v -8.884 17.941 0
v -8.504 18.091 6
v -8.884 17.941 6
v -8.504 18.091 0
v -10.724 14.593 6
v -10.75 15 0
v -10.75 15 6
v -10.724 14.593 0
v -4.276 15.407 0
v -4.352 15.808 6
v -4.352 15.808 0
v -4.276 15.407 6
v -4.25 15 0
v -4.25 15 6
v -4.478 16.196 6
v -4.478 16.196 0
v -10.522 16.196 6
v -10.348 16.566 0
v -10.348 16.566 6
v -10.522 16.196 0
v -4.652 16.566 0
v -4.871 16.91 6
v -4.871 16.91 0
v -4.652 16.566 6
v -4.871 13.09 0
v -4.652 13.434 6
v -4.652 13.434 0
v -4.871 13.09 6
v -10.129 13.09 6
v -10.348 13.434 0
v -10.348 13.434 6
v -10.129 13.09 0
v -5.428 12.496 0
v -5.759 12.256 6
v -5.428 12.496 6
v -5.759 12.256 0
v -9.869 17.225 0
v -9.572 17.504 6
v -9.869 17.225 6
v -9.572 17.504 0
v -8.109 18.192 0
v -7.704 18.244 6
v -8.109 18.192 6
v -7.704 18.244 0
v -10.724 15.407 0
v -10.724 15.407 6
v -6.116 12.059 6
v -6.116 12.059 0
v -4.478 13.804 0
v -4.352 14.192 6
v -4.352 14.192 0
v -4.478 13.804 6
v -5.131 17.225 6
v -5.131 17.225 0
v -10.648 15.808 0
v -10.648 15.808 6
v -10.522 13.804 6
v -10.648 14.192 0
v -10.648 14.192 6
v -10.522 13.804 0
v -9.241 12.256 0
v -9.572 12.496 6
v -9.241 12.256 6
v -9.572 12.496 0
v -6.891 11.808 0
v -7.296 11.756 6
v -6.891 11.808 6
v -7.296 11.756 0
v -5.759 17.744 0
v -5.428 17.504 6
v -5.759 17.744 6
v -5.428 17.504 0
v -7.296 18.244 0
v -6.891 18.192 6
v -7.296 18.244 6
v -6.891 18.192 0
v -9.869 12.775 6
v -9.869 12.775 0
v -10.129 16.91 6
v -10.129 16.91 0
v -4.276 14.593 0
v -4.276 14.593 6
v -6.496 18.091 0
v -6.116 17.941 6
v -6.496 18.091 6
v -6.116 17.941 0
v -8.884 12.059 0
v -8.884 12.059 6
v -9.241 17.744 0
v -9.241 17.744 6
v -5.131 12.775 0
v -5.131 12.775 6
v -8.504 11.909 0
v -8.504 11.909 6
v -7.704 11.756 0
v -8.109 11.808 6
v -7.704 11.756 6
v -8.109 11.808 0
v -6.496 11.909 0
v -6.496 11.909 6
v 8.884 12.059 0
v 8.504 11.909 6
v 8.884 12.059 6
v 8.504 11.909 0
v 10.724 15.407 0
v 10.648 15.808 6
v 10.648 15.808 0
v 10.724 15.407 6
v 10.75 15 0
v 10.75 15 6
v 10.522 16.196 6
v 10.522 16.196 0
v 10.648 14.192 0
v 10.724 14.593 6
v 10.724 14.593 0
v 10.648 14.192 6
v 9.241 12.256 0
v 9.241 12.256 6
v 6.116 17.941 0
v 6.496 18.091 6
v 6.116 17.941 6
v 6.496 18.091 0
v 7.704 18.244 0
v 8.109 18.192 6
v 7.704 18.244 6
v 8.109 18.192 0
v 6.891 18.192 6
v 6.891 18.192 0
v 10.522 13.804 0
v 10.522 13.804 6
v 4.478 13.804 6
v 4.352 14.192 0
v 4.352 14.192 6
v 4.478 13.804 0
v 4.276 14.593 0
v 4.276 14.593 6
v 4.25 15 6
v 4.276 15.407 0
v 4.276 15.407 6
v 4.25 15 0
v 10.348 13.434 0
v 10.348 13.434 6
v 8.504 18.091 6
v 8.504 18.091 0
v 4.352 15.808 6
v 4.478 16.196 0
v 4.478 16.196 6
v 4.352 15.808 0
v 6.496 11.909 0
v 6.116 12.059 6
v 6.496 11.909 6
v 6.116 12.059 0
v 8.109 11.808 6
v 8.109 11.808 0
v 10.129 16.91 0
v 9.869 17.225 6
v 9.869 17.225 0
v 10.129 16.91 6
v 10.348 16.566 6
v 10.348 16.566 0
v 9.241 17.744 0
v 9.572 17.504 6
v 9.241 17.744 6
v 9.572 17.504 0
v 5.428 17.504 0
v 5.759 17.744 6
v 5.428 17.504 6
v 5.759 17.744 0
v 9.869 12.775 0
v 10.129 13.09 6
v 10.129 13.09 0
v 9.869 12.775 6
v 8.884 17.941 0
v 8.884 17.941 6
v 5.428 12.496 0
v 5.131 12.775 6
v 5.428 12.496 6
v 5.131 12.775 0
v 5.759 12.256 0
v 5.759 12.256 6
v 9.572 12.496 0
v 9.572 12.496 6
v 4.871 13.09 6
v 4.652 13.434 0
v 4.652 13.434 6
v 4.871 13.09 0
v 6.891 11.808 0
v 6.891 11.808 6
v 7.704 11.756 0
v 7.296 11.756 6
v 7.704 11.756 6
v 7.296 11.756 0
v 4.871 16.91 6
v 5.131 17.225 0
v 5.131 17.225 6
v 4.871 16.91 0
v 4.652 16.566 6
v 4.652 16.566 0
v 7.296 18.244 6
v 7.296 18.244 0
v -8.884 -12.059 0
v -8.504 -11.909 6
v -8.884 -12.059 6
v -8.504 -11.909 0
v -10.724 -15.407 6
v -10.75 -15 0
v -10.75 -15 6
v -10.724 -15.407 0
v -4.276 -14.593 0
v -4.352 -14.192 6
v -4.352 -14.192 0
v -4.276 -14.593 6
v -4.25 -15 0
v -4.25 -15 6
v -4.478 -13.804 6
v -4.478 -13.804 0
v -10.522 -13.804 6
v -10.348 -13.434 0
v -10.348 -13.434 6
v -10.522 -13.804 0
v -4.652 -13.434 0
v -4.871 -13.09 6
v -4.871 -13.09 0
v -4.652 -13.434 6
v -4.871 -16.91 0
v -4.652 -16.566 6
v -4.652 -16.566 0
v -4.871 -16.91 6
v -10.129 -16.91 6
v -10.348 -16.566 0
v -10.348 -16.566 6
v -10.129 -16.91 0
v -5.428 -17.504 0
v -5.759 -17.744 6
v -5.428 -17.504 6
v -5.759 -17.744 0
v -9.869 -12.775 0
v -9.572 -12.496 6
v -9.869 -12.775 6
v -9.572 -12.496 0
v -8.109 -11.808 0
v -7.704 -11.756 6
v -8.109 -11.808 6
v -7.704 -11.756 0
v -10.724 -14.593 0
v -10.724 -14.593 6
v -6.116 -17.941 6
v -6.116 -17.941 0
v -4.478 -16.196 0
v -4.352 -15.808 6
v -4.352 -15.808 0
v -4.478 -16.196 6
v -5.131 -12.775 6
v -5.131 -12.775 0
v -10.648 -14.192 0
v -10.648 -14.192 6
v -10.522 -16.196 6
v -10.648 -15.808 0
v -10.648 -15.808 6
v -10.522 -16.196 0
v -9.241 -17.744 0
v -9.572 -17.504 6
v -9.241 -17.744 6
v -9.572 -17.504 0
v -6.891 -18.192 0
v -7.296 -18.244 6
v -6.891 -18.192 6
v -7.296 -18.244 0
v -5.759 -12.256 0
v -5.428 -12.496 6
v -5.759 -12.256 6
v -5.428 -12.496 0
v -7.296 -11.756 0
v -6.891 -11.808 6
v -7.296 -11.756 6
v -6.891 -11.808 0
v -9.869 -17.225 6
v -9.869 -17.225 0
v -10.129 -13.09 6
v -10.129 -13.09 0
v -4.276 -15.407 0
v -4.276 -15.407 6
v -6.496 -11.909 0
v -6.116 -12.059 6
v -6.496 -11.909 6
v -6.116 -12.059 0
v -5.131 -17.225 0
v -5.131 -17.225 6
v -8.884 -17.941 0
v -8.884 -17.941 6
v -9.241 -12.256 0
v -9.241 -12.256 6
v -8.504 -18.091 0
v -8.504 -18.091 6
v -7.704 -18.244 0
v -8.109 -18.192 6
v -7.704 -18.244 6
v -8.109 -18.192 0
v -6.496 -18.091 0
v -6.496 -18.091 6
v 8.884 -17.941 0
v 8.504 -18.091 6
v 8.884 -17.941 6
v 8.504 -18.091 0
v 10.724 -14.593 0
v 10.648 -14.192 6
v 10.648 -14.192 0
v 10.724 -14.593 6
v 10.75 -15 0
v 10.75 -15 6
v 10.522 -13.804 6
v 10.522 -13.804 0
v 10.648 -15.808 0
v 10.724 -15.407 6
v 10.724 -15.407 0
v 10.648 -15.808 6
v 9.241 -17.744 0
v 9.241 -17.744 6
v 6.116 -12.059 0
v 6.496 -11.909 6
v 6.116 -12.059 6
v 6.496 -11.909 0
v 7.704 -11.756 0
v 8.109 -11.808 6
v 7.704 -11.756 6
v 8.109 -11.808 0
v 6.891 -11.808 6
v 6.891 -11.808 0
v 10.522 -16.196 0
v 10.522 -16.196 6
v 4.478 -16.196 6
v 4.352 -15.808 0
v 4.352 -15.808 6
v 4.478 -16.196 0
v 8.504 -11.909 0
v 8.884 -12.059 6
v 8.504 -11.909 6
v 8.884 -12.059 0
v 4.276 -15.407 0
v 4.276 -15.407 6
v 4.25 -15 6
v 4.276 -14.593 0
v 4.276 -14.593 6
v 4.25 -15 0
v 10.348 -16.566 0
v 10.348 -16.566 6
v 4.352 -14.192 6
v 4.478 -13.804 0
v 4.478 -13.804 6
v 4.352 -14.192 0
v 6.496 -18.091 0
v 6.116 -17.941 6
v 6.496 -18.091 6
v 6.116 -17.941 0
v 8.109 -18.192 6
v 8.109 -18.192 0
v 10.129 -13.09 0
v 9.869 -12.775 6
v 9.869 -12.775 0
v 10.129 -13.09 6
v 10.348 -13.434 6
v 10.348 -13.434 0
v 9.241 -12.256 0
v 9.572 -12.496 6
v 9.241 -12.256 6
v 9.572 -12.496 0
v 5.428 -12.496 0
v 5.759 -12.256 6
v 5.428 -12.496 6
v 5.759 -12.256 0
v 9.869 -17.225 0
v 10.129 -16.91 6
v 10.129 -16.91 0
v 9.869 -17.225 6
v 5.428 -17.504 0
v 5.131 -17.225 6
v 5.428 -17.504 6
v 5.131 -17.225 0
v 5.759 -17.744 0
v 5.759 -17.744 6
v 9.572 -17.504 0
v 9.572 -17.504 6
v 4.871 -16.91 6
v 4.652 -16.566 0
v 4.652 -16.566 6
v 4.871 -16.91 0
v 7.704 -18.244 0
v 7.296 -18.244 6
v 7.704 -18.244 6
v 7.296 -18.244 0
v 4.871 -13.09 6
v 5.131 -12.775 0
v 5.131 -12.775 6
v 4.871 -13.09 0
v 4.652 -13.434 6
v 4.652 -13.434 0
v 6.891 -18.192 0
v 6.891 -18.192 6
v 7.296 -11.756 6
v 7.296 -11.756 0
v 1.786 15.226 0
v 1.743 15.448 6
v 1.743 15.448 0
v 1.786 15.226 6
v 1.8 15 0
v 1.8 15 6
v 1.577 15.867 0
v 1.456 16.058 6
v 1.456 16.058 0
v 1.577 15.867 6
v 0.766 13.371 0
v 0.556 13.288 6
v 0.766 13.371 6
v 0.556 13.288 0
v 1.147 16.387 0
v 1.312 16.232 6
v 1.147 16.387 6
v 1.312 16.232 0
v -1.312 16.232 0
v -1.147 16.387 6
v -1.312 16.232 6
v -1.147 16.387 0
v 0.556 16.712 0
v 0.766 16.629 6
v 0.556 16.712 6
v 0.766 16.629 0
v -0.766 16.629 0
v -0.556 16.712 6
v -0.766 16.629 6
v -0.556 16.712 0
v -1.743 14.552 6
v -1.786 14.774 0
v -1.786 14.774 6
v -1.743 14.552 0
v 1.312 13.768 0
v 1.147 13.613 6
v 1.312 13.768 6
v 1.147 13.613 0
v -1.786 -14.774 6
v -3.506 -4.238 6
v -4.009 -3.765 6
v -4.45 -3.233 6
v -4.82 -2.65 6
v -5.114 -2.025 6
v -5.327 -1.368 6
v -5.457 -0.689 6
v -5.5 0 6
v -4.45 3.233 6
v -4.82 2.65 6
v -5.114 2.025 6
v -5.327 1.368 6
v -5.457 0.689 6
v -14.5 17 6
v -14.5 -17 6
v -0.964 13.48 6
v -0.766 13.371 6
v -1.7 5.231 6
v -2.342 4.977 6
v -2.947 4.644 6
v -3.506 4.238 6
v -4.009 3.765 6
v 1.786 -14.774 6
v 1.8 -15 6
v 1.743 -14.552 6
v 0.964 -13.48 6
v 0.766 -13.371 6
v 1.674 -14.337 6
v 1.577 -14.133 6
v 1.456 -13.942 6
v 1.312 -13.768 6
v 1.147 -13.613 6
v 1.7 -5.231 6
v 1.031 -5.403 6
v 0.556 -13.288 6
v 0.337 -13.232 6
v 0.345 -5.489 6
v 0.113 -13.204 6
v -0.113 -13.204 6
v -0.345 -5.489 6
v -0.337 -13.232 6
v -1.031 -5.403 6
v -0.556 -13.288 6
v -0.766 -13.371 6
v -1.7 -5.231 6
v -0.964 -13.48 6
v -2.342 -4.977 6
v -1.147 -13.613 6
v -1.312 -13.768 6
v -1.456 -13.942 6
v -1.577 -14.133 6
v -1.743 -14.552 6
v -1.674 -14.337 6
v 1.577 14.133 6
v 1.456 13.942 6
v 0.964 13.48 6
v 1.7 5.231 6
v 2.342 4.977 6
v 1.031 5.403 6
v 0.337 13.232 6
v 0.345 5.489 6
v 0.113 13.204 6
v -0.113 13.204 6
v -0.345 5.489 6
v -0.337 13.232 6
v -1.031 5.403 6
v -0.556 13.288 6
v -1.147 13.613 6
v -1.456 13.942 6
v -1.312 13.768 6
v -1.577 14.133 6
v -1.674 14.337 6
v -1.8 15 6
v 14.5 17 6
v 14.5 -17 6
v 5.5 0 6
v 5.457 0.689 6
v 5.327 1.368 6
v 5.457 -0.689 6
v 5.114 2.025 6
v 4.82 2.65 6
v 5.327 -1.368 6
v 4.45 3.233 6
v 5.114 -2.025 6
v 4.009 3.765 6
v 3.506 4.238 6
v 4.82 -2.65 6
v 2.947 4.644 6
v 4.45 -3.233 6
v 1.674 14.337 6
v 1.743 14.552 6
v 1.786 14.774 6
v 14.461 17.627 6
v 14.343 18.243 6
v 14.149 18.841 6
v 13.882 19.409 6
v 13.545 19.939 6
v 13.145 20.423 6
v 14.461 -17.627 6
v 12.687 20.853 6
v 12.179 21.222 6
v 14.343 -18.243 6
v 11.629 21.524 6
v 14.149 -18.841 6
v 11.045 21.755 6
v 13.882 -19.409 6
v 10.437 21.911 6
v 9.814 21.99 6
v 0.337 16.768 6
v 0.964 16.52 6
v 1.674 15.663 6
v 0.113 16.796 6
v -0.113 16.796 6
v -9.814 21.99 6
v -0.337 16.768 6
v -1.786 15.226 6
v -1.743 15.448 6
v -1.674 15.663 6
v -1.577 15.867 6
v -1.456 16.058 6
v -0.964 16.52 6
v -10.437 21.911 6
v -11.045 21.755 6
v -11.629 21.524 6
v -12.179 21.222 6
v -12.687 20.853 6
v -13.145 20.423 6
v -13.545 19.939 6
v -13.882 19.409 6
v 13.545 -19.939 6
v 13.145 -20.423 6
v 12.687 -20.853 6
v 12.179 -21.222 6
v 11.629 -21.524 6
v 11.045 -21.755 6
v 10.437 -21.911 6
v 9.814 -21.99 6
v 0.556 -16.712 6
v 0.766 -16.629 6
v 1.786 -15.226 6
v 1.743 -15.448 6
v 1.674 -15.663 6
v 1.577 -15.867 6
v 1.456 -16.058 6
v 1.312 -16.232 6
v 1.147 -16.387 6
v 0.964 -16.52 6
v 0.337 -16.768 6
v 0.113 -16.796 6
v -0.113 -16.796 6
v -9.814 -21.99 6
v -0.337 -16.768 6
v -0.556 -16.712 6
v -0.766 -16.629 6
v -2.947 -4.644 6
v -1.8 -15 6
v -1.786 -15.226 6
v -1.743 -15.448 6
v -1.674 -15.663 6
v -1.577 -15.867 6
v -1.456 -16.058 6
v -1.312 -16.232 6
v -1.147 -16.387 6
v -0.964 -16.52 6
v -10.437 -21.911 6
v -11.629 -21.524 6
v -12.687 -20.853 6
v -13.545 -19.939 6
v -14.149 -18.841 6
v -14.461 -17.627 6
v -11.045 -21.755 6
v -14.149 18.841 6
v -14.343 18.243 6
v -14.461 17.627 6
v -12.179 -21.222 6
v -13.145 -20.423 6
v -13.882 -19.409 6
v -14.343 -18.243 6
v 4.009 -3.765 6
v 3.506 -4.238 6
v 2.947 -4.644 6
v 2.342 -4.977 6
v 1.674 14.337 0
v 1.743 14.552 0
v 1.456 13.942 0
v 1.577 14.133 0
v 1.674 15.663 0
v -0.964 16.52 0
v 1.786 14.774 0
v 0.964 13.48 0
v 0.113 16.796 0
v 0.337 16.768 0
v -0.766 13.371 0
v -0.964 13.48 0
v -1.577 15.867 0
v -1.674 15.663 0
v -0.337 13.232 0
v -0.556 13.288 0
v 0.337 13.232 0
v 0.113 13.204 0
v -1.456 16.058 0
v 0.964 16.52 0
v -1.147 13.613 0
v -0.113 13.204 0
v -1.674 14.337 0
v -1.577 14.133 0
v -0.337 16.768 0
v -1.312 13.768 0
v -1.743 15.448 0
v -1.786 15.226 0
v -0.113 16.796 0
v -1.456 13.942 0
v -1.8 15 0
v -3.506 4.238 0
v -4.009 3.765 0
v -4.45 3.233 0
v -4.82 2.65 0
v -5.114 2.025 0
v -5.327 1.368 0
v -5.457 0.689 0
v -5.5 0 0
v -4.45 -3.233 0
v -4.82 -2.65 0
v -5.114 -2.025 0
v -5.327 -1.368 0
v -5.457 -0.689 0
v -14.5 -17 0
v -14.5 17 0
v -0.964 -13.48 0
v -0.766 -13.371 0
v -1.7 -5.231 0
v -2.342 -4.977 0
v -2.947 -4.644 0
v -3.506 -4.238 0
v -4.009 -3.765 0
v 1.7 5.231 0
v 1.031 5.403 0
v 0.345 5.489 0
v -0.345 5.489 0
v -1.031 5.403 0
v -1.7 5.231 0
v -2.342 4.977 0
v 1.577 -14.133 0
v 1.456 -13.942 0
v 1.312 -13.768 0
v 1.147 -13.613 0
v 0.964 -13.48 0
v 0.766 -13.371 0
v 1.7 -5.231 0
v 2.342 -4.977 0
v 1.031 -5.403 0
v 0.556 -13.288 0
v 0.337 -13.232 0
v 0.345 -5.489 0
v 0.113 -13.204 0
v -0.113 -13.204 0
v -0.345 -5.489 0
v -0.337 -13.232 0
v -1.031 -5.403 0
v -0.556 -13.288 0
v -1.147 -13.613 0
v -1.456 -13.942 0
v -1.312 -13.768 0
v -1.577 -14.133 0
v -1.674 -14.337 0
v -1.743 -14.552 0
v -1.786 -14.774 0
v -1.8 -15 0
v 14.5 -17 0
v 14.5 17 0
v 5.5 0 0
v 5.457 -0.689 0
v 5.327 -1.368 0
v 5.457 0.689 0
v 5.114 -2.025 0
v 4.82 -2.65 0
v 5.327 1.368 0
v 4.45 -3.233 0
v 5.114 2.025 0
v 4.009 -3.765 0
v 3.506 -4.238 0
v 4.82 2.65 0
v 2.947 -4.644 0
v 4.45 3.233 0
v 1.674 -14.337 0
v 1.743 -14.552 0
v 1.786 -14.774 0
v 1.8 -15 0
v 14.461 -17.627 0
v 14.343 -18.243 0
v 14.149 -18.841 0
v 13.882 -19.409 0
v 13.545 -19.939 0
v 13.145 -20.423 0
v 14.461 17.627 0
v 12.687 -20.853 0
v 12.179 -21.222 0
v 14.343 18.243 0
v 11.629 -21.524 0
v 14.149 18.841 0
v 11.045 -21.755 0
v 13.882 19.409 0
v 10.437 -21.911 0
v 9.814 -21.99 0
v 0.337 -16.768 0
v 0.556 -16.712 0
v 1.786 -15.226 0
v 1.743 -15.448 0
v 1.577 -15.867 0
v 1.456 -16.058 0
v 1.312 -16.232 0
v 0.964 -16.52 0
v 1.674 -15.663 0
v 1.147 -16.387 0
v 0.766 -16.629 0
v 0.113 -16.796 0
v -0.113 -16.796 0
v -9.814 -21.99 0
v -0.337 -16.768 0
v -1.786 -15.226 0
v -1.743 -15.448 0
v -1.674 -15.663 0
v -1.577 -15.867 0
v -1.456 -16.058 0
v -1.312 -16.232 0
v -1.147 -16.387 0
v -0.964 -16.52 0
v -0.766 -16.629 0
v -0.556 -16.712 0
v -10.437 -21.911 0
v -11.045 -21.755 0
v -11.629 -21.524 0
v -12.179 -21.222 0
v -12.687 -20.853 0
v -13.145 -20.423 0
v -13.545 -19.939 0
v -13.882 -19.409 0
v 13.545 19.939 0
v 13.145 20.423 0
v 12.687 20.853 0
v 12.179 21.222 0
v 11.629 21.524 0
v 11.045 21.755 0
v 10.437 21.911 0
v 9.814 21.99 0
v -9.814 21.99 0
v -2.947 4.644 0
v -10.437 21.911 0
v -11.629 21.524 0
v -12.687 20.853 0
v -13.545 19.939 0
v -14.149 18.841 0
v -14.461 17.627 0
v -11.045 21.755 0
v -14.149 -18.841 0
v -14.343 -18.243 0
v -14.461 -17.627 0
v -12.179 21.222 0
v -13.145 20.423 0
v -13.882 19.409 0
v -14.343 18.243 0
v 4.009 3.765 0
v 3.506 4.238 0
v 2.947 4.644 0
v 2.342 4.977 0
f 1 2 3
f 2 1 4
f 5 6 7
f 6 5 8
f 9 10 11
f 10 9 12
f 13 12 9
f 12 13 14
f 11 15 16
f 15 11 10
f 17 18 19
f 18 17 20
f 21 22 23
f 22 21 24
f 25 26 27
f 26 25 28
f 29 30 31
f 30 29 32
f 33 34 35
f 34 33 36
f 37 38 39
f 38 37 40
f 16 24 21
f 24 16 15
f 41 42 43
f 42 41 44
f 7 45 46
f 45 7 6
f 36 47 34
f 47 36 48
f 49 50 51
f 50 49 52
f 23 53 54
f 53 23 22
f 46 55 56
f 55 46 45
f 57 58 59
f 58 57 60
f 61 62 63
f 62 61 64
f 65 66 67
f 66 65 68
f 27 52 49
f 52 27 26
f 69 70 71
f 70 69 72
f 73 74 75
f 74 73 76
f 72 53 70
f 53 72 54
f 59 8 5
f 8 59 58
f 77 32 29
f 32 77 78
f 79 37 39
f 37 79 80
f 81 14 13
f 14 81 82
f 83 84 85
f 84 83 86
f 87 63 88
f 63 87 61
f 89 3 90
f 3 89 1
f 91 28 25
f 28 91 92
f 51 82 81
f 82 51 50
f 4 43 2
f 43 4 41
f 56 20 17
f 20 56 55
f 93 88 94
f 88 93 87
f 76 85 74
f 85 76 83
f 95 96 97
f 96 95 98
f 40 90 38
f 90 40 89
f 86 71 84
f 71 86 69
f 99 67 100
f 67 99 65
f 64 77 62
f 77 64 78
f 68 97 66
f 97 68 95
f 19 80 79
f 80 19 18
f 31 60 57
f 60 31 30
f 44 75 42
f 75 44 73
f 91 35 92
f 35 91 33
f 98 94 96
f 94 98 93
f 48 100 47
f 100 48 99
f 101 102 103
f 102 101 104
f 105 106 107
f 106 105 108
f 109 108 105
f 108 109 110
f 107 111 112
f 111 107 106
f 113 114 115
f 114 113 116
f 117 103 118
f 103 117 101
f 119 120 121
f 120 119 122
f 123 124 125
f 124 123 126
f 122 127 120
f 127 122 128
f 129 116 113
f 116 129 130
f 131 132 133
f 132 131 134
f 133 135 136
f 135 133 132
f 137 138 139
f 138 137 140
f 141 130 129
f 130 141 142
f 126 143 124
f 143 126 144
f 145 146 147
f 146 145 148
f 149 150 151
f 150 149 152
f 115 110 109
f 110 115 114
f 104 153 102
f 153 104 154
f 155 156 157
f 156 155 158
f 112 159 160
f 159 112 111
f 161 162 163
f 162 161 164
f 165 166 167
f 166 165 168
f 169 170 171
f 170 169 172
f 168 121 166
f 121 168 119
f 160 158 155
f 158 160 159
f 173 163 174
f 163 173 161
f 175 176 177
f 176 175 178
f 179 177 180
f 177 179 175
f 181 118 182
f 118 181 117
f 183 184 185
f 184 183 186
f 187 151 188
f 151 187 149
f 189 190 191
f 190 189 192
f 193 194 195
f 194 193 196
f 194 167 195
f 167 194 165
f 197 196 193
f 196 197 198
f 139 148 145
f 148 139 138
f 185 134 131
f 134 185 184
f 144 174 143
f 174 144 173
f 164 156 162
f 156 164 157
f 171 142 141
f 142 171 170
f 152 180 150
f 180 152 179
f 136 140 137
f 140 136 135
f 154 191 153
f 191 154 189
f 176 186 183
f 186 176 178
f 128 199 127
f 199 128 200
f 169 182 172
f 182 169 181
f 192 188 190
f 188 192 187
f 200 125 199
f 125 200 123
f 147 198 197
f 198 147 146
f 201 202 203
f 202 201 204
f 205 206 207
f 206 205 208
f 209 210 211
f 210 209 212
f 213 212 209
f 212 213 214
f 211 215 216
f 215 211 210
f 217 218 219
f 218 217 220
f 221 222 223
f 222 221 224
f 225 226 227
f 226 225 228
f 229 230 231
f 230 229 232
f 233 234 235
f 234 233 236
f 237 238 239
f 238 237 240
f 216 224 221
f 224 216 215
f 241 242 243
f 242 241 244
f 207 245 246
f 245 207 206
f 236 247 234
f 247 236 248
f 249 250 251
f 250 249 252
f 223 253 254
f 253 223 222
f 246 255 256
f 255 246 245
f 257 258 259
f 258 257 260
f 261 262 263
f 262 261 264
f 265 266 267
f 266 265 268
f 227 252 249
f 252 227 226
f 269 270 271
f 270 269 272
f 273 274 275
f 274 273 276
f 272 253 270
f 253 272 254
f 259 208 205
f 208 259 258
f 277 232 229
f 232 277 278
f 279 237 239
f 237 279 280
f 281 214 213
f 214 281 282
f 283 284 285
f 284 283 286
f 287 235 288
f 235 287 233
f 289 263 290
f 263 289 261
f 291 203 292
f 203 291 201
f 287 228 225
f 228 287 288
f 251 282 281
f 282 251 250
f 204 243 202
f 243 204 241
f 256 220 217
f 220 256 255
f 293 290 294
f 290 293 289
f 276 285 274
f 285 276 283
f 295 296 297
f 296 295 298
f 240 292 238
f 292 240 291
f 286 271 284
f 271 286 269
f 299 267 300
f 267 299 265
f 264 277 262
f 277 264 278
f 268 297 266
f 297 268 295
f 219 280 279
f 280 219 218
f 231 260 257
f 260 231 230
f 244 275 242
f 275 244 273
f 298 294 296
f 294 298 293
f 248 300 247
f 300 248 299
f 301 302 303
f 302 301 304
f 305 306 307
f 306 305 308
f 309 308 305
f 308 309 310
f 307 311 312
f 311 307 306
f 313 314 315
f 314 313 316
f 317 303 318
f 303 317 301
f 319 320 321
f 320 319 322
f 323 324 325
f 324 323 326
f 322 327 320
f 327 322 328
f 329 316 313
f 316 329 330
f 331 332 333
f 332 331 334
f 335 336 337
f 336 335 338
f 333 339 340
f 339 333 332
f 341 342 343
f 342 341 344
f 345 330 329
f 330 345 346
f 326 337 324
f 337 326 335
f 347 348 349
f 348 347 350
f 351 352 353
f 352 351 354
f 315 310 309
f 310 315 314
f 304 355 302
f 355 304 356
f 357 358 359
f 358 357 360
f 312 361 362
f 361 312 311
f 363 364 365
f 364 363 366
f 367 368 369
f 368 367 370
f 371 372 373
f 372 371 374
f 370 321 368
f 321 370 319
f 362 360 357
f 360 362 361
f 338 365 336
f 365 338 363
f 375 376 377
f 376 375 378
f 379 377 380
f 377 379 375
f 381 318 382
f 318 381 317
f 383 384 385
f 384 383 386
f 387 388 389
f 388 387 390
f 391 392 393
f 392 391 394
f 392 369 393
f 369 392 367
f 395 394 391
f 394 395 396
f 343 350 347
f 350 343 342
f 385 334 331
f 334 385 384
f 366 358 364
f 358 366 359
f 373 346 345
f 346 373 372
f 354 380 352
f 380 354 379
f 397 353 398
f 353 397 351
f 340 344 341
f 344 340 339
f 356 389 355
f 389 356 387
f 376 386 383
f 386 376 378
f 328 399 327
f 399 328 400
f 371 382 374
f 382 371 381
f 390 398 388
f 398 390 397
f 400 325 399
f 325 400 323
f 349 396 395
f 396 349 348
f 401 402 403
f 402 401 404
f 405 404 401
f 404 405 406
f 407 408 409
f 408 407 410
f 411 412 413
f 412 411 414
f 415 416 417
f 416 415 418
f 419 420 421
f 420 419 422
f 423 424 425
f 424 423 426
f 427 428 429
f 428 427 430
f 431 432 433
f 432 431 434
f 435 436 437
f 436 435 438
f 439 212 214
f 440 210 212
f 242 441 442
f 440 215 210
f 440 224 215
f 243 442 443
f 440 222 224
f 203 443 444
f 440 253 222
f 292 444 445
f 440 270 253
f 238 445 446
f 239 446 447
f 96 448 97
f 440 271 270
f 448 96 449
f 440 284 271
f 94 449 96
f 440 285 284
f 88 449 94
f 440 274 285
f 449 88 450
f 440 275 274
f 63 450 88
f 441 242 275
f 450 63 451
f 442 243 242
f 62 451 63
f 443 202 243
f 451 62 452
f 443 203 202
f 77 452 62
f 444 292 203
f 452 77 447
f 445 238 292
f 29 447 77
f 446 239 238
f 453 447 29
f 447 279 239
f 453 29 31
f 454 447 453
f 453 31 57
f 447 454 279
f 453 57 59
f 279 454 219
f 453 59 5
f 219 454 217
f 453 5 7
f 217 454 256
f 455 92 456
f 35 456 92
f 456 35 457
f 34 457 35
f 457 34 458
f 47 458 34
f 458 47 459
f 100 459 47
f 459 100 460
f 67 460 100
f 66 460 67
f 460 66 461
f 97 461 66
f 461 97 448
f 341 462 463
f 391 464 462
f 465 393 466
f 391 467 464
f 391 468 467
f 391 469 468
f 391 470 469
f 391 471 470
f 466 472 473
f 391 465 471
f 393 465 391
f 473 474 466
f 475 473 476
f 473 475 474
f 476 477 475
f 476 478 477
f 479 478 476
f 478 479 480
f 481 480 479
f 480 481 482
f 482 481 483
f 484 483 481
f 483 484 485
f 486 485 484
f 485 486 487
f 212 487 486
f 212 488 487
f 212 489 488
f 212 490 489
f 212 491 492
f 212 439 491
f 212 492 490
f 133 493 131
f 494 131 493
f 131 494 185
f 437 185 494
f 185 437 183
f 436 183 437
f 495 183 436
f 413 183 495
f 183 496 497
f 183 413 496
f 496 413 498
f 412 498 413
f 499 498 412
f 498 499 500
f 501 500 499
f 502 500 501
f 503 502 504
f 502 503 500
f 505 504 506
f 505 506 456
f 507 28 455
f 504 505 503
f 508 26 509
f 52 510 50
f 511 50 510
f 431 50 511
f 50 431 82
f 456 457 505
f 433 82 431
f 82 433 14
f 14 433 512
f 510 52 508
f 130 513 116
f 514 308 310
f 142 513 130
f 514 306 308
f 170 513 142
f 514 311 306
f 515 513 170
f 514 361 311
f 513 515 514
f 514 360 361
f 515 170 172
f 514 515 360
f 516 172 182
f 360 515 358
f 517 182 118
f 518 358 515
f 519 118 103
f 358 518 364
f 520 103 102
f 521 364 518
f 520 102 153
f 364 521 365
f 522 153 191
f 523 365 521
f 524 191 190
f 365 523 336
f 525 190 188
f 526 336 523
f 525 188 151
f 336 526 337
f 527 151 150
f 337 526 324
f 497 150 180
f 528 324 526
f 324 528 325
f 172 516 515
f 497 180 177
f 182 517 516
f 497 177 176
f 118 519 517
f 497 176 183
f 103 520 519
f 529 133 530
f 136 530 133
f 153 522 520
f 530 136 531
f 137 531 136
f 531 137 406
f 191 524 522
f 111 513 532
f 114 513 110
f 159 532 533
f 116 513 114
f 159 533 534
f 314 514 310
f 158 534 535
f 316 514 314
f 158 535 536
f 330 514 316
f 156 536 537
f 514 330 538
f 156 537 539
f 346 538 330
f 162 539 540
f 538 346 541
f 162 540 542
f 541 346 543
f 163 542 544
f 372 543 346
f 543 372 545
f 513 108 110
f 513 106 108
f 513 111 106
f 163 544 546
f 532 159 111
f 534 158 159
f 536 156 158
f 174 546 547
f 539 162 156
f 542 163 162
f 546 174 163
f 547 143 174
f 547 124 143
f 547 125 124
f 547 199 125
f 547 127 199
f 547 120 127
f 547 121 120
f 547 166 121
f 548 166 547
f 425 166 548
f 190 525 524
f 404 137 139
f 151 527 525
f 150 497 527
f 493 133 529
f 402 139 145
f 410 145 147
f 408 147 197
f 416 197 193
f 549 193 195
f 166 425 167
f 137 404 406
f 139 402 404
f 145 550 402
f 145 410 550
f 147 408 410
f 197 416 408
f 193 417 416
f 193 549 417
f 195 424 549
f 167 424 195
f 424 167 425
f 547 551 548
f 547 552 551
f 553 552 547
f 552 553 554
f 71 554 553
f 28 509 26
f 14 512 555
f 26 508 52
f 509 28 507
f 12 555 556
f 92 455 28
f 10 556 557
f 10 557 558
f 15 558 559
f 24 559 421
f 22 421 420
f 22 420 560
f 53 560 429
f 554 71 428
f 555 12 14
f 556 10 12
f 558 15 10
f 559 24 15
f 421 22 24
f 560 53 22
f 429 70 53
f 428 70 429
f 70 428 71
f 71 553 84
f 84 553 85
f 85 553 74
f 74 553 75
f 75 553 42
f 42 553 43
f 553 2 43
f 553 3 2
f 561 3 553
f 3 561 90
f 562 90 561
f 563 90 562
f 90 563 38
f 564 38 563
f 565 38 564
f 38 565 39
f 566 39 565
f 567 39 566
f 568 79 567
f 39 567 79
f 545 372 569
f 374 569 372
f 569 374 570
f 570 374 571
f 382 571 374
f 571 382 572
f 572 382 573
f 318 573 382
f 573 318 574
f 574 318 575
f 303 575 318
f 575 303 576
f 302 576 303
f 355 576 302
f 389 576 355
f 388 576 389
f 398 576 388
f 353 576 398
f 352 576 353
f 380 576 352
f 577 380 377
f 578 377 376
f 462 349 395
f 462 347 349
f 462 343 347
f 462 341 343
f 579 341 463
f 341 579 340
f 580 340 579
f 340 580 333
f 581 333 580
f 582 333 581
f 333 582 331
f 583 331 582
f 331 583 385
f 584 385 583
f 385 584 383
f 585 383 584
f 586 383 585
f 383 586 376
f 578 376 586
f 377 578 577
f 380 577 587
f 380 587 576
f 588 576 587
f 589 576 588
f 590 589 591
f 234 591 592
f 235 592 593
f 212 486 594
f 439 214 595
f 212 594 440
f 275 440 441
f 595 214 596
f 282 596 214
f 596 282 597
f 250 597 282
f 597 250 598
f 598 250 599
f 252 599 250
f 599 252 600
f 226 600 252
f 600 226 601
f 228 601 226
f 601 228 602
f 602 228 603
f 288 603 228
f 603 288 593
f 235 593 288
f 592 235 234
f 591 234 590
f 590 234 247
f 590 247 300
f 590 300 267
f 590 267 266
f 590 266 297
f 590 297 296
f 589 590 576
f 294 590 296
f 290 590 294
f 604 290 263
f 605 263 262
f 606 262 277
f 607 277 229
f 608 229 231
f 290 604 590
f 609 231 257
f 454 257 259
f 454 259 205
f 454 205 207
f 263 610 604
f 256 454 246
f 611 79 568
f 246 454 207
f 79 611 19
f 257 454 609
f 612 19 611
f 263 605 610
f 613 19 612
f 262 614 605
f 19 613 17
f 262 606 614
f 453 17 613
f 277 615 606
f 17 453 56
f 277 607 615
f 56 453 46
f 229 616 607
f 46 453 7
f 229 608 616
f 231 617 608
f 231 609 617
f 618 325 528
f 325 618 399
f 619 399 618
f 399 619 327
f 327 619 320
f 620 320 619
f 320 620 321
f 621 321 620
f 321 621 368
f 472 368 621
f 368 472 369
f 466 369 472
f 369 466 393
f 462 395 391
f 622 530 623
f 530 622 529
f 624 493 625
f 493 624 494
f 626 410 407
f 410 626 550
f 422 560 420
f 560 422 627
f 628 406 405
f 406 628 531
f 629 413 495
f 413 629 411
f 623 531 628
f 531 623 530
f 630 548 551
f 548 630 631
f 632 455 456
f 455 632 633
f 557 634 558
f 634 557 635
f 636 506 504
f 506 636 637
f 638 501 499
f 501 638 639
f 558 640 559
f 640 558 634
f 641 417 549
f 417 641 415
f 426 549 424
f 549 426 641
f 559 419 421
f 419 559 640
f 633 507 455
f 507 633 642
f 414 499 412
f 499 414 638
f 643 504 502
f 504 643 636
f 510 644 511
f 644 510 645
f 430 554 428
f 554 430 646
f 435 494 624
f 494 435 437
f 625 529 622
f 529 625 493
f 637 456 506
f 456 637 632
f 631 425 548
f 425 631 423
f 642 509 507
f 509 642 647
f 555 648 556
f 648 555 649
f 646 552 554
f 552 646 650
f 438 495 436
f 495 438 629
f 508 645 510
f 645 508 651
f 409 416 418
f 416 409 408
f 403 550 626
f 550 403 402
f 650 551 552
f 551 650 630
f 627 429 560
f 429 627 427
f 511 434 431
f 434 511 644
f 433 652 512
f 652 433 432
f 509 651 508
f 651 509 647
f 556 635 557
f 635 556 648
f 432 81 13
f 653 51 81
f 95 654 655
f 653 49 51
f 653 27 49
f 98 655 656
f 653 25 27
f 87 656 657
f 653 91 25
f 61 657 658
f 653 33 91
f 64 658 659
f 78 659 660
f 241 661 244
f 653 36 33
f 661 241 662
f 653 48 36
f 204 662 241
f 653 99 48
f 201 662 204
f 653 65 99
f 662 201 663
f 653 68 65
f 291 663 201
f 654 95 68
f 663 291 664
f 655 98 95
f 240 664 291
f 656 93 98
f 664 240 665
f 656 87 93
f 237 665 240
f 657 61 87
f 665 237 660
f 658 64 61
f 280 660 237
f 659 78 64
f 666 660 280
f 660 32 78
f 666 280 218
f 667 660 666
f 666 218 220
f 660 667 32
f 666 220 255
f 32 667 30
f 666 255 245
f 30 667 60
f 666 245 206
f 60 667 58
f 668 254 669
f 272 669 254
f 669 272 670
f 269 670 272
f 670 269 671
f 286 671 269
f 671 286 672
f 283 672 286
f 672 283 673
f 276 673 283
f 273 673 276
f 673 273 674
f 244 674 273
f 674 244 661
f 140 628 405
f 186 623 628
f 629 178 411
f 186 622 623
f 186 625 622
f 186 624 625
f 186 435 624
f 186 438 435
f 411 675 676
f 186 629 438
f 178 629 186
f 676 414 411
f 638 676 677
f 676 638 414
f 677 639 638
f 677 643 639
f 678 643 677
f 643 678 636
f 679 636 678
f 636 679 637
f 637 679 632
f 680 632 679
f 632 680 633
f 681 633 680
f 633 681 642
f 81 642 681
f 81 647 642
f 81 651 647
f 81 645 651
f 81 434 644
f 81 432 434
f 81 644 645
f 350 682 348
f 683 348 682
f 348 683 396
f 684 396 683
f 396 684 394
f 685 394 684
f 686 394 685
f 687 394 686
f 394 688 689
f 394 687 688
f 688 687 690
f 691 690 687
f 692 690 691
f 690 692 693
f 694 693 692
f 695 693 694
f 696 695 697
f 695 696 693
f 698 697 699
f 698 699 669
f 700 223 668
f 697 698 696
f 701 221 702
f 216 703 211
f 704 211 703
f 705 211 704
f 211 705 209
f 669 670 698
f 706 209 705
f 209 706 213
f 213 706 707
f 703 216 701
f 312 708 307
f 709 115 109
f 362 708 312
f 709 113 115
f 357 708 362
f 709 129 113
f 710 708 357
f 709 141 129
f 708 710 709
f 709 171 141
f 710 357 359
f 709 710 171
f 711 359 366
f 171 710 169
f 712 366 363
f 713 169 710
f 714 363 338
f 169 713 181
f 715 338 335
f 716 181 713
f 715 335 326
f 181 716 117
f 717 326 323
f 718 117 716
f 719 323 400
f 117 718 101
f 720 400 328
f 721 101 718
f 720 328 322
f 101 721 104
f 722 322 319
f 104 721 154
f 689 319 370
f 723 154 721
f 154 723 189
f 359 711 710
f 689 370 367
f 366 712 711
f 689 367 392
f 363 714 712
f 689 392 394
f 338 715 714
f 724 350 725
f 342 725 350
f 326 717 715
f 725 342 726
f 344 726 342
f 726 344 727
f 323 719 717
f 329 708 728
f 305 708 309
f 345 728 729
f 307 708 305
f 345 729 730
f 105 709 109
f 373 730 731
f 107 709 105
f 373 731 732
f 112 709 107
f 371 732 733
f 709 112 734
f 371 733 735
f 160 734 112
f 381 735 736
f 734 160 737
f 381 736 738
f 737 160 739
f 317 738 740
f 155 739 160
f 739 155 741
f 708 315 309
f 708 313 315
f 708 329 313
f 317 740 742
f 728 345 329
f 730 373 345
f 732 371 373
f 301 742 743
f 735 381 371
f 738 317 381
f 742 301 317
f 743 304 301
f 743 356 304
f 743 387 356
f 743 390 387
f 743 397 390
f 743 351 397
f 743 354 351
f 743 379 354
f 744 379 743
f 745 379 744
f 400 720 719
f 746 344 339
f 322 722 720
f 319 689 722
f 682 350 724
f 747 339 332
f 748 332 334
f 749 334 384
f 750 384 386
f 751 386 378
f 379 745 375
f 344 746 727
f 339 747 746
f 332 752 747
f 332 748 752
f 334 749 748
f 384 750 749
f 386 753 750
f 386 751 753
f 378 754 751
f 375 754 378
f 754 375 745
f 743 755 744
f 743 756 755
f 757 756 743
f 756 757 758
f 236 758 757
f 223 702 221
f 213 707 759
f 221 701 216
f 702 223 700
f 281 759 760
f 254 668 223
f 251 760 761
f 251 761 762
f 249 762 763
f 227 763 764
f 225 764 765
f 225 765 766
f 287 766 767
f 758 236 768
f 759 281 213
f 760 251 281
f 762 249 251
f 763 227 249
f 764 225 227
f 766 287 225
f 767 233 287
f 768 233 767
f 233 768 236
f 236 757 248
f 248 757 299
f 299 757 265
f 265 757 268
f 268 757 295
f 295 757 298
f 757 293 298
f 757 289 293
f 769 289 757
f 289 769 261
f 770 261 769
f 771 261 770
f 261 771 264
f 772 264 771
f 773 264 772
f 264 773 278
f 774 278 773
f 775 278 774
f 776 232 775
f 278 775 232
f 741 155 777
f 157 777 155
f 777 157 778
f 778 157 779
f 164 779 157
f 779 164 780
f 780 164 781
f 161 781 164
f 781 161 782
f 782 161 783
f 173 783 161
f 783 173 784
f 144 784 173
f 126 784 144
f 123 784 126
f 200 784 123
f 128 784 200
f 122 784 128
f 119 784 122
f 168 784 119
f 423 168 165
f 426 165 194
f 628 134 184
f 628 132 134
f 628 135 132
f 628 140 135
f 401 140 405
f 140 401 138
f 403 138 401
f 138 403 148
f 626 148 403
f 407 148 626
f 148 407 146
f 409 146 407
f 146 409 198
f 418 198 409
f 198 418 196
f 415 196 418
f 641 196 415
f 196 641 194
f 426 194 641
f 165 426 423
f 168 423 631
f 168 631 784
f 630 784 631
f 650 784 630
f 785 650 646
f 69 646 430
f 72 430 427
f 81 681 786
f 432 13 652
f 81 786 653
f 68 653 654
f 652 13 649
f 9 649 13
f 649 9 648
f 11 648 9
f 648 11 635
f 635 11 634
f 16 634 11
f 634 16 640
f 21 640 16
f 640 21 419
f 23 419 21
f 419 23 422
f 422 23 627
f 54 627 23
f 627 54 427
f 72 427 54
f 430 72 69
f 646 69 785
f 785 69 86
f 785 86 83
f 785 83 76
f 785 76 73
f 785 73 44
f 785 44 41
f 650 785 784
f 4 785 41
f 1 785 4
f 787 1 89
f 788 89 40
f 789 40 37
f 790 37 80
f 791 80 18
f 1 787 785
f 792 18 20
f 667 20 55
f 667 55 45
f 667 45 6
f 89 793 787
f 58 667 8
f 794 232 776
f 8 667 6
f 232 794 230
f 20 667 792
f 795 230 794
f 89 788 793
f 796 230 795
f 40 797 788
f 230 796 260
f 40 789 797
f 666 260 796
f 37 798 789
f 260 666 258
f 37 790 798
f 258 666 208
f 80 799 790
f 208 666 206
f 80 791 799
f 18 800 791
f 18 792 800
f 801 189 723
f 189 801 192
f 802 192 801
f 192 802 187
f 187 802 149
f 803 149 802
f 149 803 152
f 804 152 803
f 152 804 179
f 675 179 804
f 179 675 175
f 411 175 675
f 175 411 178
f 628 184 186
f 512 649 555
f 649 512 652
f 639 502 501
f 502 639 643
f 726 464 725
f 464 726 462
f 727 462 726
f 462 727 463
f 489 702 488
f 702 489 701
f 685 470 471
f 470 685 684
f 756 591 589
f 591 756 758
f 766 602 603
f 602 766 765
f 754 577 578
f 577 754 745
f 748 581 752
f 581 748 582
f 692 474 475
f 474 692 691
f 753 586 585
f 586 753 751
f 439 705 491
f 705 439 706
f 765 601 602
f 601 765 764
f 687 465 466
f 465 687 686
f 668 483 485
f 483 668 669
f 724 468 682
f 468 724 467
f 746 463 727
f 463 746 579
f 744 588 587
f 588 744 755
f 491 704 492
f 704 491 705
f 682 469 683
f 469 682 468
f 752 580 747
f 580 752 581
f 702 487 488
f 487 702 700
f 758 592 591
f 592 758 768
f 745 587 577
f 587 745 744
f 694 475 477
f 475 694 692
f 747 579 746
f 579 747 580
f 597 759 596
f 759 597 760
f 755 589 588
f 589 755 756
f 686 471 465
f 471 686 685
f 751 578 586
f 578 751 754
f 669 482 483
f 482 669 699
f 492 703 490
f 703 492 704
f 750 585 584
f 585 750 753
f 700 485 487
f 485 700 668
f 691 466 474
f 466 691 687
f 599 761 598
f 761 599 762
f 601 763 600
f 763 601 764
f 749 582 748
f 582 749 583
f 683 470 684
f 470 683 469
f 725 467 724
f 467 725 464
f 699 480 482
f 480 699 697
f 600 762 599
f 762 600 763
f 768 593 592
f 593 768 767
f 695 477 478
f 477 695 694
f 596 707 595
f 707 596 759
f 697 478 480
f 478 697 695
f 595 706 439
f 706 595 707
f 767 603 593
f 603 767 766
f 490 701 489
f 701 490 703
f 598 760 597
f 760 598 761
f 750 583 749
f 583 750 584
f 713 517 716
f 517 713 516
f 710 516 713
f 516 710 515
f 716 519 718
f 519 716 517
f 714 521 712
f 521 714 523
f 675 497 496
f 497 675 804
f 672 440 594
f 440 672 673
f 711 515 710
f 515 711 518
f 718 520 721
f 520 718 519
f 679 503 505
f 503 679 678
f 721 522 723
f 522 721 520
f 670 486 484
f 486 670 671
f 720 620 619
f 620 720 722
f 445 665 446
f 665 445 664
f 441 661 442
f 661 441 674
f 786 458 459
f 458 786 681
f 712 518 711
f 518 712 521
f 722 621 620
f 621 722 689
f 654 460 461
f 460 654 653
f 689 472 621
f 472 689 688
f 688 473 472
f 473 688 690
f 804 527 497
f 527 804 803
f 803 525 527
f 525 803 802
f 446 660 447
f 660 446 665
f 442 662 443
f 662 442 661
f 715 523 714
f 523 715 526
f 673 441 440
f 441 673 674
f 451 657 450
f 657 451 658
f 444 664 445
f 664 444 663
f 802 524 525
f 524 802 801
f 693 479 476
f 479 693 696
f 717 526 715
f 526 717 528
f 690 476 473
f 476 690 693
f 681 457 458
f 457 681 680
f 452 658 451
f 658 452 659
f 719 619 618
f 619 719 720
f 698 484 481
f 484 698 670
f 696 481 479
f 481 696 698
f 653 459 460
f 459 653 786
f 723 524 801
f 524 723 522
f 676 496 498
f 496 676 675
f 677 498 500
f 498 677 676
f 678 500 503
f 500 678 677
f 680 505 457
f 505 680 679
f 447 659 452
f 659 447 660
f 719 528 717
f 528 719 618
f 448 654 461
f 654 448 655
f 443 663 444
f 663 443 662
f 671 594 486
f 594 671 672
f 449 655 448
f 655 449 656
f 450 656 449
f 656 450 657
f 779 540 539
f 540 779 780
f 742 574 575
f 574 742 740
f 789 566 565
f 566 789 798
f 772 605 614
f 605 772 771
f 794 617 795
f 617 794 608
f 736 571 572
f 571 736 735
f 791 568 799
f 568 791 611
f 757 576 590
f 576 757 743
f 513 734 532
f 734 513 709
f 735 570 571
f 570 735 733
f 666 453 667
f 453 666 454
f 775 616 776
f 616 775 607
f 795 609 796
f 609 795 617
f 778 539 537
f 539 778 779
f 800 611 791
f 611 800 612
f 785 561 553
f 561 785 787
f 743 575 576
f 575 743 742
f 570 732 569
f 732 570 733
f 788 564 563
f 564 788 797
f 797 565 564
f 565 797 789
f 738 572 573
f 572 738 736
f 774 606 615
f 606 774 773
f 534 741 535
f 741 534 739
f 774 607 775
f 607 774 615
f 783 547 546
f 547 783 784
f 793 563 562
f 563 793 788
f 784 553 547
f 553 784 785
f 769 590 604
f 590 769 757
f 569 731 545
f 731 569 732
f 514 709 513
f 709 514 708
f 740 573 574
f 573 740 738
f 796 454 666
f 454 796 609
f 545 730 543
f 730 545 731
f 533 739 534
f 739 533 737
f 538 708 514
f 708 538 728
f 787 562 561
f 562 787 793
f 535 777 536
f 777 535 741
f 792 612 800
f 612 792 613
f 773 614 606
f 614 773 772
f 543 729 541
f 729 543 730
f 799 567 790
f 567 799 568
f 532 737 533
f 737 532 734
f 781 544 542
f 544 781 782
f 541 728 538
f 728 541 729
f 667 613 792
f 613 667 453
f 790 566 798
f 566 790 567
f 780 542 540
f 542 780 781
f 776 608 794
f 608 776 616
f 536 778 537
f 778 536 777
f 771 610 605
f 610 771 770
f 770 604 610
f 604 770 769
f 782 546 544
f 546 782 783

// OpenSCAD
$fn = 50;


difference() {
	union() {
		hull() {
			translate(v = [-9.5000000000, 17.0000000000, 0]) {
				cylinder(h = 6, r = 5);
			}
			translate(v = [9.5000000000, 17.0000000000, 0]) {
				cylinder(h = 6, r = 5);
			}
			translate(v = [-9.5000000000, -17.0000000000, 0]) {
				cylinder(h = 6, r = 5);
			}
			translate(v = [9.5000000000, -17.0000000000, 0]) {
				cylinder(h = 6, r = 5);
			}
		}
	}
	union() {
		#translate(v = [-7.5000000000, 15.0000000000, 0]) {
			cylinder(h = 6, r = 3.2500000000);
		}
		#translate(v = [7.5000000000, 15.0000000000, 0]) {
			cylinder(h = 6, r = 3.2500000000);
		}
		#translate(v = [-7.5000000000, -15.0000000000, 0]) {
			cylinder(h = 6, r = 3.2500000000);
		}
		#translate(v = [7.5000000000, -15.0000000000, 0]) {
			cylinder(h = 6, r = 3.2500000000);
		}
		#translate(v = [-7.5000000000, -15.0000000000, -100.0000000000]) {
			cylinder(h = 200, r = 3.2500000000);
		}
		#translate(v = [-7.5000000000, 15.0000000000, -100.0000000000]) {
			cylinder(h = 200, r = 3.2500000000);
		}
		#translate(v = [7.5000000000, -15.0000000000, -100.0000000000]) {
			cylinder(h = 200, r = 3.2500000000);
		}
		#translate(v = [7.5000000000, 15.0000000000, -100.0000000000]) {
			cylinder(h = 200, r = 3.2500000000);
		}
		#translate(v = [-7.5000000000, 15.0000000000, 0]) {
			cylinder(h = 6, r = 1.8000000000);
		}
		#translate(v = [0.0000000000, 15.0000000000, 0]) {
			cylinder(h = 6, r = 1.8000000000);
		}
		#translate(v = [7.5000000000, 15.0000000000, 0]) {
			cylinder(h = 6, r = 1.8000000000);
		}
		#translate(v = [-7.5000000000, -15.0000000000, 0]) {
			cylinder(h = 6, r = 1.8000000000);
		}
		#translate(v = [0.0000000000, -15.0000000000, 0]) {
			cylinder(h = 6, r = 1.8000000000);
		}
		#translate(v = [7.5000000000, -15.0000000000, 0]) {
			cylinder(h = 6, r = 1.8000000000);
		}
		#translate(v = [-7.5000000000, 15.0000000000, 0]) {
			cylinder(h = 6, r = 1.8000000000);
		}
		#translate(v = [0.0000000000, 15.0000000000, 0]) {
			cylinder(h = 6, r = 1.8000000000);
		}
		#translate(v = [7.5000000000, 15.0000000000, 0]) {
			cylinder(h = 6, r = 1.8000000000);
		}
		#translate(v = [-7.5000000000, -15.0000000000, 0]) {
			cylinder(h = 6, r = 1.8000000000);
		}
		#translate(v = [0.0000000000, -15.0000000000, 0]) {
			cylinder(h = 6, r = 1.8000000000);
		}
		#translate(v = [7.5000000000, -15.0000000000, 0]) {
			cylinder(h = 6, r = 1.8000000000);
		}
		#translate(v = [-7.5000000000, 15.0000000000, 0]) {
			cylinder(h = 6, r = 1.8000000000);
		}
		#translate(v = [0.0000000000, 15.0000000000, 0]) {
			cylinder(h = 6, r = 1.8000000000);
		}
		#translate(v = [7.5000000000, 15.0000000000, 0]) {
			cylinder(h = 6, r = 1.8000000000);
		}
		#translate(v = [-7.5000000000, -15.0000000000, 0]) {
			cylinder(h = 6, r = 1.8000000000);
		}
		#translate(v = [0.0000000000, -15.0000000000, 0]) {
			cylinder(h = 6, r = 1.8000000000);
		}
		#translate(v = [7.5000000000, -15.0000000000, 0]) {
			cylinder(h = 6, r = 1.8000000000);
		}
		#cylinder(h = 6, r = 5.5000000000);
	}
}
